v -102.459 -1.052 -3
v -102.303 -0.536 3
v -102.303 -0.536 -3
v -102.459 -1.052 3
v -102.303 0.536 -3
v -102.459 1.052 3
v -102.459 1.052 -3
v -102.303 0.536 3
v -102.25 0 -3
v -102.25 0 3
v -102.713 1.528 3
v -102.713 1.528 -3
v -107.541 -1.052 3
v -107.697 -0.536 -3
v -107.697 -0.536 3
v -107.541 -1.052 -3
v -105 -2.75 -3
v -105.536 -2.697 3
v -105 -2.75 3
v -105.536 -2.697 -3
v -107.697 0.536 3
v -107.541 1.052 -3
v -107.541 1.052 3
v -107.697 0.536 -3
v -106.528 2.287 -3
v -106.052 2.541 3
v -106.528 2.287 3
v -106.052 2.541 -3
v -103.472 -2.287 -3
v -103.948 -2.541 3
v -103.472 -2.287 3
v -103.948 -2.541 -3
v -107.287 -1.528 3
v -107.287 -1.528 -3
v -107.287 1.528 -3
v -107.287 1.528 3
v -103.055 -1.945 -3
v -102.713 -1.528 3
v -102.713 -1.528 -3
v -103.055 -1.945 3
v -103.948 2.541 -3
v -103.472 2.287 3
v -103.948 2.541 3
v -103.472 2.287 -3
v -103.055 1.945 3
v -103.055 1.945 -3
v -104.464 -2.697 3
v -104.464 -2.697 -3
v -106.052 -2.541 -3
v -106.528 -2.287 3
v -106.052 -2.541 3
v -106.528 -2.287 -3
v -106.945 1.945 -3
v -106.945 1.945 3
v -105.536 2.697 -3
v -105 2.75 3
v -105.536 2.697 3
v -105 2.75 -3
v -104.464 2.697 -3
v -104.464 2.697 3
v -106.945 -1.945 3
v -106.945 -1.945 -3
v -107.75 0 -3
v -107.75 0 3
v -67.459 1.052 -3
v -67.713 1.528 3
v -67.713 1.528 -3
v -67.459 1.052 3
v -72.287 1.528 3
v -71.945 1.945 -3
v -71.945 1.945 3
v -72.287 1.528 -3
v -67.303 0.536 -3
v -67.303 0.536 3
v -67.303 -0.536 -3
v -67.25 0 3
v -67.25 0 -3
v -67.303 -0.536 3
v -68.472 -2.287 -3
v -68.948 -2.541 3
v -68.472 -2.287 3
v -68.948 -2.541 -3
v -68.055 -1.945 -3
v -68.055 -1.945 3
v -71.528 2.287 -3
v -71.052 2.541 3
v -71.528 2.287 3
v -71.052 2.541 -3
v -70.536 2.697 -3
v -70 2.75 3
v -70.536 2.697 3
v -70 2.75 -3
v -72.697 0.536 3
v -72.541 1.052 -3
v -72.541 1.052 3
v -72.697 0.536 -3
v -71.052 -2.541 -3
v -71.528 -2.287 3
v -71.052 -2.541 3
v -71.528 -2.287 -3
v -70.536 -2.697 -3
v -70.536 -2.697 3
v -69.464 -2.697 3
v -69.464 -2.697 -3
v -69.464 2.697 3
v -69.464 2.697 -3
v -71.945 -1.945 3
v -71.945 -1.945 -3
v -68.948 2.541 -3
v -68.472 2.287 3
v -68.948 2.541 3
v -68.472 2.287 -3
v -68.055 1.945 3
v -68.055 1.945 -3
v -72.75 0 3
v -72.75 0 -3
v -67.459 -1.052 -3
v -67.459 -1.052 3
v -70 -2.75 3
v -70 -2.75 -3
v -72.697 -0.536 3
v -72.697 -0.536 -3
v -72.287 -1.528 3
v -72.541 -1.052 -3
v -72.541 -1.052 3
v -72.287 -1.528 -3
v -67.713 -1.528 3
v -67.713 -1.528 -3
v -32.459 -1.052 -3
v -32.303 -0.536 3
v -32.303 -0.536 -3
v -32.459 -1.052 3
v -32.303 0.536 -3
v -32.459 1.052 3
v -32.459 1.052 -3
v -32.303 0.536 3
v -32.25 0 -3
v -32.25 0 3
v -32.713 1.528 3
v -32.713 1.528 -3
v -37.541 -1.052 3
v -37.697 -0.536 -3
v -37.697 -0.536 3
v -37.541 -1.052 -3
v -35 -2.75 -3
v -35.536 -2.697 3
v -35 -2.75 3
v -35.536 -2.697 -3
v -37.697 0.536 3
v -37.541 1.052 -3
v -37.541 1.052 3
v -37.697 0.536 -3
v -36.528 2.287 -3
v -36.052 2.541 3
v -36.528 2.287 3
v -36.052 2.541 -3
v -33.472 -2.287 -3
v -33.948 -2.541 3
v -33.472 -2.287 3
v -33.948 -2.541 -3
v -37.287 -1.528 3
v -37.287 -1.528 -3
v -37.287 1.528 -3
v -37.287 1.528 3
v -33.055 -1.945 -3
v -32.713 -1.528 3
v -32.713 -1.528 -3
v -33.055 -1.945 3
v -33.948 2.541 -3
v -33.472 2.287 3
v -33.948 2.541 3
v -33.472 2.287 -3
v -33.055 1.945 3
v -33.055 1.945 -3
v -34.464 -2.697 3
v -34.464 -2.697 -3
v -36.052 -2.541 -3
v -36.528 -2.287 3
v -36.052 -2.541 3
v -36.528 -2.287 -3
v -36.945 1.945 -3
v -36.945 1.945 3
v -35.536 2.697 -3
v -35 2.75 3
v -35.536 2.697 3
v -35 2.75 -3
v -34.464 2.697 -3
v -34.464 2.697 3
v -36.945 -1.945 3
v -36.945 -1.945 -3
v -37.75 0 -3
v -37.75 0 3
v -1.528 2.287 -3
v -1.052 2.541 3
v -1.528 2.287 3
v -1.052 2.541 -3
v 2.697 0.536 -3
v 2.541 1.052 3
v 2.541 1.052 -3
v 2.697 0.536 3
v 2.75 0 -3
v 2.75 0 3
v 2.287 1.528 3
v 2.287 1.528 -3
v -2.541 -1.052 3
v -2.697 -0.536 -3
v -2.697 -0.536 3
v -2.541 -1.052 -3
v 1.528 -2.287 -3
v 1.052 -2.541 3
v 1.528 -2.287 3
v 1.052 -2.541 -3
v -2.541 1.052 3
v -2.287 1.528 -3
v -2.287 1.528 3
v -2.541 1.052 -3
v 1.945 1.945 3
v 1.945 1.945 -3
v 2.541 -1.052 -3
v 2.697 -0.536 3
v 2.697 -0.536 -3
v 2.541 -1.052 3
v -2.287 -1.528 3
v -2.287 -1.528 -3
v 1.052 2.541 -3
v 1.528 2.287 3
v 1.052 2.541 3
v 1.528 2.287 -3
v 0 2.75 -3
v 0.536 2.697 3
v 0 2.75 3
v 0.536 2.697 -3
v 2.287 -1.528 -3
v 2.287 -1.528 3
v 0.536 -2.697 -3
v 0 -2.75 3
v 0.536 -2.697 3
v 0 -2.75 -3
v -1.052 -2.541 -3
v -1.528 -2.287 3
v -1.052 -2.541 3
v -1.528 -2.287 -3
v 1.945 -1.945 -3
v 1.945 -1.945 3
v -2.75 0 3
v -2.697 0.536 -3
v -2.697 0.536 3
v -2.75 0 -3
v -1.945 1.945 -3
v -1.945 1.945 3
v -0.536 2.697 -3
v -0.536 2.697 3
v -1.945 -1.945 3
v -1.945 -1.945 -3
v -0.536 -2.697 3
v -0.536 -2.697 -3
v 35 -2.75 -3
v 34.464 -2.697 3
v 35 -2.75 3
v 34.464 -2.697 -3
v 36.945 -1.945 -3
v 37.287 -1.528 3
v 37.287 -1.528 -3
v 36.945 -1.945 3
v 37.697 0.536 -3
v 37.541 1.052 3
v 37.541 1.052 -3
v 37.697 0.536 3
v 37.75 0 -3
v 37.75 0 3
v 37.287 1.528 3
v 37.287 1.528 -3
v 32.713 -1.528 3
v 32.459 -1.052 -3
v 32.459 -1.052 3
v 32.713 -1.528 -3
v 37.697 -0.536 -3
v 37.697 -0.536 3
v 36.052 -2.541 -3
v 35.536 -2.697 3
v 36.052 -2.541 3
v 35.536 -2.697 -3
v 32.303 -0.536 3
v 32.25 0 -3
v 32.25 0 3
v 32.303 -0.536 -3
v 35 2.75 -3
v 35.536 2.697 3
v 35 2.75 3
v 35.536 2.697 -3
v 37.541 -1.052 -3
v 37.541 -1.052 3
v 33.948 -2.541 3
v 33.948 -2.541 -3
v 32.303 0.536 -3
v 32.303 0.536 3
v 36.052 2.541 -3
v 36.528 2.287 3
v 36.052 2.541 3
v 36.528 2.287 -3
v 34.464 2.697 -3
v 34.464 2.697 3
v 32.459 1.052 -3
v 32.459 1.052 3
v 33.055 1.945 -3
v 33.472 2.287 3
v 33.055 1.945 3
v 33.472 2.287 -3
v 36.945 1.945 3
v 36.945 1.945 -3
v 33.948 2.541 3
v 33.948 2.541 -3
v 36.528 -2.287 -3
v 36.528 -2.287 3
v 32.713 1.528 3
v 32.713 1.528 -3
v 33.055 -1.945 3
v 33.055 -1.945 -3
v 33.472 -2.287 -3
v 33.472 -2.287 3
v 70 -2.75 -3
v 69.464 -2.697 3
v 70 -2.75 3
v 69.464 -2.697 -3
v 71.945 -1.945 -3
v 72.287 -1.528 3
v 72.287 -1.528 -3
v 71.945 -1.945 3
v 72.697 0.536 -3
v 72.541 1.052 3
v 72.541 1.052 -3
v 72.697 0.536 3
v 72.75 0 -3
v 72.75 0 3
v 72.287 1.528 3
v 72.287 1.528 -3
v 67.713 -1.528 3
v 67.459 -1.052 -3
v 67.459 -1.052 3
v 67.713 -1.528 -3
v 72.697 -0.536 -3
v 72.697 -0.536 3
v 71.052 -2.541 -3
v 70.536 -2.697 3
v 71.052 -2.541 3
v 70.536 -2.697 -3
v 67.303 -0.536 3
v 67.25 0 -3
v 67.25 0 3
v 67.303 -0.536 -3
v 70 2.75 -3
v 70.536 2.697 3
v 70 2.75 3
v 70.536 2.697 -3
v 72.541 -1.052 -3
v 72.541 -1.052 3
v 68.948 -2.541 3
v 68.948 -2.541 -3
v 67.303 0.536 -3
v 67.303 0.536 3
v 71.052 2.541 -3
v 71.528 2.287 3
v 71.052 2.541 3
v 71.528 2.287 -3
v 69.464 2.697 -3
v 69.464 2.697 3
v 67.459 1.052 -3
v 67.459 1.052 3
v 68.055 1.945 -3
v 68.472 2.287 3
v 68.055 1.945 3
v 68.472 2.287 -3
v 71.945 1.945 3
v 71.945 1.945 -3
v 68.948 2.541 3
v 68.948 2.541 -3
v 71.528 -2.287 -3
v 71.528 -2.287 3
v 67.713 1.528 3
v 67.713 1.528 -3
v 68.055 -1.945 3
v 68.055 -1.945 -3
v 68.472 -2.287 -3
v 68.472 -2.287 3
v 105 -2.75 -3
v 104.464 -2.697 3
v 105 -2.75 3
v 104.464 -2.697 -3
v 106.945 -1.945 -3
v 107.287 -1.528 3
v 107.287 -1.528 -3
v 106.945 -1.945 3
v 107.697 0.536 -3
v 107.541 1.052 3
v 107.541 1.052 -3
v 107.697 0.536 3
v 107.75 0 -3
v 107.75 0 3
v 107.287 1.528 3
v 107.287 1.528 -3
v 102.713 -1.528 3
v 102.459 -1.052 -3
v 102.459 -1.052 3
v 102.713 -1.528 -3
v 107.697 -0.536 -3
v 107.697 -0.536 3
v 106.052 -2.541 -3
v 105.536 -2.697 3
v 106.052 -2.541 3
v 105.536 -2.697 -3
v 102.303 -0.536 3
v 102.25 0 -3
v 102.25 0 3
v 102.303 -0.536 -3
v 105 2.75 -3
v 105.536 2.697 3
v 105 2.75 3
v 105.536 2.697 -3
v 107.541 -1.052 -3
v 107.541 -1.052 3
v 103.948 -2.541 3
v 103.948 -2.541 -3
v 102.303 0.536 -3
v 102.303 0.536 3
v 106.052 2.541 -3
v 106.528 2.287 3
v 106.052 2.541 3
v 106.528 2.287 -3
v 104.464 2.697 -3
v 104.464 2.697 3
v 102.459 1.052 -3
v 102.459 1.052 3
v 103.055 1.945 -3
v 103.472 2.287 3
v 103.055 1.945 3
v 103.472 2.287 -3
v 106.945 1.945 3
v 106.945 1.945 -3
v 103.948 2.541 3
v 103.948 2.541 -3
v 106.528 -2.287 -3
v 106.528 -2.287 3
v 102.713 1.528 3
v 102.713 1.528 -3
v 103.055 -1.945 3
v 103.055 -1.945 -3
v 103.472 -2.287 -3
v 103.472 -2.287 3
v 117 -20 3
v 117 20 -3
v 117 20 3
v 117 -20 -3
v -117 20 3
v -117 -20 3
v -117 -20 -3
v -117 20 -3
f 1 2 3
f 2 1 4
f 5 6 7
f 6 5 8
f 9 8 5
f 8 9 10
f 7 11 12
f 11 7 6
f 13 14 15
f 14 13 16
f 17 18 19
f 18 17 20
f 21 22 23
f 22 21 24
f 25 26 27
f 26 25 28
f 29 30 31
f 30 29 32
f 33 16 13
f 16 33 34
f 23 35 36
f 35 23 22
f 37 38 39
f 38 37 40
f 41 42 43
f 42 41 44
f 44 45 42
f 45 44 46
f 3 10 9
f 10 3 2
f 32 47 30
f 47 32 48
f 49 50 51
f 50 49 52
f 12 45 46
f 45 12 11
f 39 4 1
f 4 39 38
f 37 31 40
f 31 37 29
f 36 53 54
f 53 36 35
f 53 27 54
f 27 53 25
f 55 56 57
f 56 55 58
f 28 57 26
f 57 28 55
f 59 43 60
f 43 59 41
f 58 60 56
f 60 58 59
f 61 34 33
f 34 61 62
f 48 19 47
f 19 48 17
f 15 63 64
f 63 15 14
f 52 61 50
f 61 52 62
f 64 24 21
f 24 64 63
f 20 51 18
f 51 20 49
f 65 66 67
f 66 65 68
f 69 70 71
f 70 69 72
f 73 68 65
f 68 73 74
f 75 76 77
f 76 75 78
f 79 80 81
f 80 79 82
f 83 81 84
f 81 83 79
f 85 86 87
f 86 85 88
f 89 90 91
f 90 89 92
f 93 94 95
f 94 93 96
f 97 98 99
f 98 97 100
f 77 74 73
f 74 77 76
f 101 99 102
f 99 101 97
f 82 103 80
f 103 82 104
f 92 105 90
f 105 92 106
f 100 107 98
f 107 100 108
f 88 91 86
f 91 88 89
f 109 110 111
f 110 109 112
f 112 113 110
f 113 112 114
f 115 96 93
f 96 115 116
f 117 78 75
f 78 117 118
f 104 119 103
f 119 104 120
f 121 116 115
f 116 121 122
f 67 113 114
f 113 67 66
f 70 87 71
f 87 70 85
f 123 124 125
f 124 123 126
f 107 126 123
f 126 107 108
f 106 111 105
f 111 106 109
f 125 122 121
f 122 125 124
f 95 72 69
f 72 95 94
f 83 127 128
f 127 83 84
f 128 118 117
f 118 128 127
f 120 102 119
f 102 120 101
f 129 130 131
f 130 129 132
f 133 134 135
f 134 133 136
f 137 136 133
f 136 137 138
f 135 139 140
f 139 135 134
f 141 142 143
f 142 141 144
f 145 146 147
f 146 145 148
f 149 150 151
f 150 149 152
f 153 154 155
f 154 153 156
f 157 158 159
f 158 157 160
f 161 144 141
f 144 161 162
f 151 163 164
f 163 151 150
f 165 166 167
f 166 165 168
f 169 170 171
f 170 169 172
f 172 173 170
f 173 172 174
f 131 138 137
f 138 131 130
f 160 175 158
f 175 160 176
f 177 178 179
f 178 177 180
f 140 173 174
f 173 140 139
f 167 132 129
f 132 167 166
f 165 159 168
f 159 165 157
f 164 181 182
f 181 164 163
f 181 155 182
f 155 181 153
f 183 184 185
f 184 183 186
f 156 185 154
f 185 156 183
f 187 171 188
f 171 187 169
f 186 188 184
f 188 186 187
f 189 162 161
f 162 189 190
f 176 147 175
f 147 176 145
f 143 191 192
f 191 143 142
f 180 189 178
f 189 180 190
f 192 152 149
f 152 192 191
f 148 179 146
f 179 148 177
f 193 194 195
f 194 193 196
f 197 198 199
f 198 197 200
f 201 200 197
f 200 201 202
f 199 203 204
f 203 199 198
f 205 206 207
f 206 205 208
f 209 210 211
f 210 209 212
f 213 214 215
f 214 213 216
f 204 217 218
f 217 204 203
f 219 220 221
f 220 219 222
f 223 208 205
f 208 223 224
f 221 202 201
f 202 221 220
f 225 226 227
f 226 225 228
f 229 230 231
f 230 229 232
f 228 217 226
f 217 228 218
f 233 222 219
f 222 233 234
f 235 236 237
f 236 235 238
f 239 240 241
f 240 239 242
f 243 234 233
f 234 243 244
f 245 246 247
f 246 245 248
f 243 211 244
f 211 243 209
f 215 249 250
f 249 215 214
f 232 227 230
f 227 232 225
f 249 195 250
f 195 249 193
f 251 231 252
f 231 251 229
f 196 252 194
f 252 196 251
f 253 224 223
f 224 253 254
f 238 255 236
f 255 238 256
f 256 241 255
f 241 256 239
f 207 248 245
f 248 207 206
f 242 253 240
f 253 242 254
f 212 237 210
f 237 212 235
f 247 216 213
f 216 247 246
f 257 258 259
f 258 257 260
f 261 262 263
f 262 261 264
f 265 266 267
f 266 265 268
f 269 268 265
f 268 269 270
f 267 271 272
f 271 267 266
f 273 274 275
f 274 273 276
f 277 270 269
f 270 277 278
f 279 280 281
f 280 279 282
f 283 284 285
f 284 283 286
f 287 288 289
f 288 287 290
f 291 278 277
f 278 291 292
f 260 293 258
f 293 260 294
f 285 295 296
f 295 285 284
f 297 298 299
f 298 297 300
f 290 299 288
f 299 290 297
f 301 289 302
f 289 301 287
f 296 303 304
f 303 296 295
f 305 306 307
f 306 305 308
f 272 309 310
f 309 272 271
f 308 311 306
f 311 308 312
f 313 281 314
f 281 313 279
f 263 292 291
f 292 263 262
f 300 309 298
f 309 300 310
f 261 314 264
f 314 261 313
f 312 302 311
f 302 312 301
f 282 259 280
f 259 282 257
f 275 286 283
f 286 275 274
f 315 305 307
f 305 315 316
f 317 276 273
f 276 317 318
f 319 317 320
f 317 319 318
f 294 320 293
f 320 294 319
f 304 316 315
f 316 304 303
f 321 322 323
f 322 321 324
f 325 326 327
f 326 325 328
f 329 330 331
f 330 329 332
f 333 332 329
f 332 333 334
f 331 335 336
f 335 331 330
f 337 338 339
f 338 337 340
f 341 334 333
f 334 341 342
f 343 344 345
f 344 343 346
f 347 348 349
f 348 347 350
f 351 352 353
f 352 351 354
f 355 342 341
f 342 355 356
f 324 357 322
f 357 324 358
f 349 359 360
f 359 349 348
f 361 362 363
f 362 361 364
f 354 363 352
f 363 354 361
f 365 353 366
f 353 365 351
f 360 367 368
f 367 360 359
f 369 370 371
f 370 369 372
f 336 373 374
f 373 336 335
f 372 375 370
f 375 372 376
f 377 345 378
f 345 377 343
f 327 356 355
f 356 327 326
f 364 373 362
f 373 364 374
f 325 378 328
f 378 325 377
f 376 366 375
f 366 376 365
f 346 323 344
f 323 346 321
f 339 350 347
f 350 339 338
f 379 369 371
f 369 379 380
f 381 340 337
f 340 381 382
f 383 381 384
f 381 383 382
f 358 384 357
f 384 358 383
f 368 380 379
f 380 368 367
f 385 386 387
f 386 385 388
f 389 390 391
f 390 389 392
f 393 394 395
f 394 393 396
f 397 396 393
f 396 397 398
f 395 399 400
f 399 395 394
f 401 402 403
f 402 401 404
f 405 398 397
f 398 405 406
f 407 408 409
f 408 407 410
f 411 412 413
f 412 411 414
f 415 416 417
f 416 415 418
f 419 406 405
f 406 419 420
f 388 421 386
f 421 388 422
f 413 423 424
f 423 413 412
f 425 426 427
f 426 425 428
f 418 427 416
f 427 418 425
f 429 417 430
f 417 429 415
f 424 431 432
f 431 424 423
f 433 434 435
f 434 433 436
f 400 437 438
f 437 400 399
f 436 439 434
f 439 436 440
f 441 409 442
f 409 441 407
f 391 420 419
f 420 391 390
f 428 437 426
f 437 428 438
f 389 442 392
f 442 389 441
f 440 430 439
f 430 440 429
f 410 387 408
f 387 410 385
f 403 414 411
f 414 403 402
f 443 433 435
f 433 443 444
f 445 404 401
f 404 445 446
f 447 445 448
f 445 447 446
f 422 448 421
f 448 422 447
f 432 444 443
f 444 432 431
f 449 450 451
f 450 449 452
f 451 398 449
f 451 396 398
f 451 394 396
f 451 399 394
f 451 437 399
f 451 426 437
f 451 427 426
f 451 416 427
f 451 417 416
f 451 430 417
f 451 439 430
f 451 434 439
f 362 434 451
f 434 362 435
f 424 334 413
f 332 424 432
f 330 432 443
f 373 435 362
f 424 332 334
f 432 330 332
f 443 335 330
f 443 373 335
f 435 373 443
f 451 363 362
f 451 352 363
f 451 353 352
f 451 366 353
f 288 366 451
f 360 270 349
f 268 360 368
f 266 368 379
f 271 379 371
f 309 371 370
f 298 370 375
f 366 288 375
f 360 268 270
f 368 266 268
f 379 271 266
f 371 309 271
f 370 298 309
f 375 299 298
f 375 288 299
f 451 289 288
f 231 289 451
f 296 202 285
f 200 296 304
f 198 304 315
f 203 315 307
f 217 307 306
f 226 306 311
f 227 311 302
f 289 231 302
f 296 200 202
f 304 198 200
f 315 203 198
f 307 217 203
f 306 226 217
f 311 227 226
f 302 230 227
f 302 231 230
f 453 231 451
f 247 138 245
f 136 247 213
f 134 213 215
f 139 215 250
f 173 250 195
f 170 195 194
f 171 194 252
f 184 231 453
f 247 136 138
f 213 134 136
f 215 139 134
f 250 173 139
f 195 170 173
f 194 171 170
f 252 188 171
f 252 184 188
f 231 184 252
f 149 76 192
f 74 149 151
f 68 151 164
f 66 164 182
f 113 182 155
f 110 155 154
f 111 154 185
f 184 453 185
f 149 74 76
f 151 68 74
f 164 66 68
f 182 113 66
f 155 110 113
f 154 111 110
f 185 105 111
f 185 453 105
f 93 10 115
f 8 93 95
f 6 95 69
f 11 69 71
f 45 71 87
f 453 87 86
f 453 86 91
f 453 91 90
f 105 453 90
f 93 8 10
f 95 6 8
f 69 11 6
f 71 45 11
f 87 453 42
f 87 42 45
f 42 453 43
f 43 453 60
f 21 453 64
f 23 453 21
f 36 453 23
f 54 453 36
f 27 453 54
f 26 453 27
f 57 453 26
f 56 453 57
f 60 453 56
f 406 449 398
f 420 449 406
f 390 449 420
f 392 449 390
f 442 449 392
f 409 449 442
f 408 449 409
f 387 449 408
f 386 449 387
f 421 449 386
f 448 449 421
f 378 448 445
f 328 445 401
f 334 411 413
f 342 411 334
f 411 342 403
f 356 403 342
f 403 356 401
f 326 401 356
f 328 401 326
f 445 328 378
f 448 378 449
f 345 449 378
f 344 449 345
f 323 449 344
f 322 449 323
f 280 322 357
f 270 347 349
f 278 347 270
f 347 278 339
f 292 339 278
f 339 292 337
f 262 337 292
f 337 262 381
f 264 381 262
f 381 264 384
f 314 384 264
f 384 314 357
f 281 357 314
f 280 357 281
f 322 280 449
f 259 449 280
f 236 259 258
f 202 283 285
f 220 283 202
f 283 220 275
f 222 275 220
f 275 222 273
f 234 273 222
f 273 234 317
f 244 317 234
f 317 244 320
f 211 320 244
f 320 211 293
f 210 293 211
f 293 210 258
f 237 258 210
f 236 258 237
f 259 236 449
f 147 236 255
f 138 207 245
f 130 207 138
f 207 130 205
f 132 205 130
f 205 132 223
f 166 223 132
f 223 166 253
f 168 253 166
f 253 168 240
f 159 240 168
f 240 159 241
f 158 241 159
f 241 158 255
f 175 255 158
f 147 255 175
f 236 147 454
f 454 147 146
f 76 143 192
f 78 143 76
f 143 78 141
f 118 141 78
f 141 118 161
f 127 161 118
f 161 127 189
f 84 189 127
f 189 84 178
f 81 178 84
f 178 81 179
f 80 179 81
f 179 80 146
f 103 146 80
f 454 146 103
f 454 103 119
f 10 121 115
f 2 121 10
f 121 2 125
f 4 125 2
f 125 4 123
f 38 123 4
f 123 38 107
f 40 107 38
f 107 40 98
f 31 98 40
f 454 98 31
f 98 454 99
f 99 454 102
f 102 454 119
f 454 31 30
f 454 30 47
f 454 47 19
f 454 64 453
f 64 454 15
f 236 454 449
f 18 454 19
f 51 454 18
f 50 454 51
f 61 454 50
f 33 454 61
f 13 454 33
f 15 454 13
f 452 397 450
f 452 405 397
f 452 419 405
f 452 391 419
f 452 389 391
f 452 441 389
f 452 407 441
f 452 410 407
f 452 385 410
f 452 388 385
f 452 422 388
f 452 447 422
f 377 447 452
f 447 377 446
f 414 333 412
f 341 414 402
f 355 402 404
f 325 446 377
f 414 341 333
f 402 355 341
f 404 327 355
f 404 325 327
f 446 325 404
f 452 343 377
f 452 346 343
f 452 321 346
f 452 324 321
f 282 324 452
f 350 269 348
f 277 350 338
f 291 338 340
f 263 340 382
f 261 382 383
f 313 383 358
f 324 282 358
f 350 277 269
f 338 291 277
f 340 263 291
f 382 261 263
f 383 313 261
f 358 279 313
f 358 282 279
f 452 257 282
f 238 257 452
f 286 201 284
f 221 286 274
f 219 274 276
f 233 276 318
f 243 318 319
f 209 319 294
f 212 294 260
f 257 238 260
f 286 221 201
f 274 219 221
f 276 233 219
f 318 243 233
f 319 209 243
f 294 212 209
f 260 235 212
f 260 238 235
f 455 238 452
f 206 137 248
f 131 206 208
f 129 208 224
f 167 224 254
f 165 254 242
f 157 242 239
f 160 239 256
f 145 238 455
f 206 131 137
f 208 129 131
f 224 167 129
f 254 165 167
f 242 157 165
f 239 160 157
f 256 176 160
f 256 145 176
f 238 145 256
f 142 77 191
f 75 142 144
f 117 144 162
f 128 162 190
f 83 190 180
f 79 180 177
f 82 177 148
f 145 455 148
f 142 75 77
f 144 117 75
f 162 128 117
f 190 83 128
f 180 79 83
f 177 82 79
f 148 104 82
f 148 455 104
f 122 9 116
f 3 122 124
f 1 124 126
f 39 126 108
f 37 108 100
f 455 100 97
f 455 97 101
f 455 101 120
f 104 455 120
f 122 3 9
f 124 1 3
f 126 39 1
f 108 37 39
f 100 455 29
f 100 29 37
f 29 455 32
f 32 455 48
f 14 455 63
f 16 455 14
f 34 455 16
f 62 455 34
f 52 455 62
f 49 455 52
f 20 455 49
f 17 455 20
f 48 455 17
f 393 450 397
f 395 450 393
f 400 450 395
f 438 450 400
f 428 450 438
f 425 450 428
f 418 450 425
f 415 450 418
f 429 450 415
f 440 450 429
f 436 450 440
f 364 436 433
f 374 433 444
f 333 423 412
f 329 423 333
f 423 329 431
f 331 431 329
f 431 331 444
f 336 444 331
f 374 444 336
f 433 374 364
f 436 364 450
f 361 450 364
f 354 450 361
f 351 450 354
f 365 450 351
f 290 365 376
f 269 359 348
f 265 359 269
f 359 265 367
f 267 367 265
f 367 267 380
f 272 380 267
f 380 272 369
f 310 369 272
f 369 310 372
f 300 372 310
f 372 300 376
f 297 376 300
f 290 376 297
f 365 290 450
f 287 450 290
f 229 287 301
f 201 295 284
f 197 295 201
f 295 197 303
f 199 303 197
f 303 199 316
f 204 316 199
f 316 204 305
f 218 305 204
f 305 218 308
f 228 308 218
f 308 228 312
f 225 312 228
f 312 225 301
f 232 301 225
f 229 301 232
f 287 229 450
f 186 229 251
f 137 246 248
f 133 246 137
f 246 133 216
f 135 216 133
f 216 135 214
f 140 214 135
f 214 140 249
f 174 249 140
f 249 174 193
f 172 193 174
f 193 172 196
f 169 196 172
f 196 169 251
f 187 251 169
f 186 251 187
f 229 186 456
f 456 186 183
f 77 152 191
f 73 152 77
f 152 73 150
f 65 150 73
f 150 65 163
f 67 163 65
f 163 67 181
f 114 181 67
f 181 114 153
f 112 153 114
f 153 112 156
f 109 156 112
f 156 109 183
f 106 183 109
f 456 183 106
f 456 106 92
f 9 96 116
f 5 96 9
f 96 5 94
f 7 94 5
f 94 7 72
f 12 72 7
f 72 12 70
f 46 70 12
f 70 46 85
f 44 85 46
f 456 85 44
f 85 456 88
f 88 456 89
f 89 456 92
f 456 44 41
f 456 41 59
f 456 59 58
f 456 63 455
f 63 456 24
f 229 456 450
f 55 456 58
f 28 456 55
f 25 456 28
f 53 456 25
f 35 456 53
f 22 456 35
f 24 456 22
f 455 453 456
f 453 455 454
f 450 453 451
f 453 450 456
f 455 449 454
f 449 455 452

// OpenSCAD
$fn = 32;

// ----------------------------------------------------------------------
// Hole bar, 7 x Ø5.5
// skip layout, 12 mm edge offset
// ----------------------------------------------------------------------

// --- parameters (mm) ---
bar_w = 40;         // bar width (Y)
bar_t = 6;          // bar thickness (Z)
holes = 7;          // holes per row
hole_d = 5.5;       // hole diameter
edge = 12;          // offset from the bar end to the first hole
grid_pitch = 17.5;  // grid the bar was laid out on

// --- derived feature positions (mm) ---
pitch = grid_pitch * 2;       // = 35   holes sit every other grid slot
span = (holes - 1) * pitch;   // = 210   distance between the end holes
bar_l = span + 2 * edge;      // = 234   overall bar length
start_x = -bar_l / 2 + edge;  // = -105   X of the first hole
feature_centers = [
  [start_x + 0 * pitch, 0],
  [start_x + 1 * pitch, 0],
  [start_x + 2 * pitch, 0],
  [start_x + 3 * pitch, 0],
  [start_x + 4 * pitch, 0],
  [start_x + 5 * pitch, 0],
  [start_x + 6 * pitch, 0]
];   // hole centres of the first row

// bar with one row of holes, drilled from feature_centers
difference() {
  translate([-bar_l / 2, -bar_w / 2, -bar_t / 2]) cube([bar_l, bar_w, bar_t]);
  for (centre = feature_centers)
    translate([centre[0], centre[1], 0])
      cylinder(d = hole_d, h = bar_t + 2, center = true);
}
